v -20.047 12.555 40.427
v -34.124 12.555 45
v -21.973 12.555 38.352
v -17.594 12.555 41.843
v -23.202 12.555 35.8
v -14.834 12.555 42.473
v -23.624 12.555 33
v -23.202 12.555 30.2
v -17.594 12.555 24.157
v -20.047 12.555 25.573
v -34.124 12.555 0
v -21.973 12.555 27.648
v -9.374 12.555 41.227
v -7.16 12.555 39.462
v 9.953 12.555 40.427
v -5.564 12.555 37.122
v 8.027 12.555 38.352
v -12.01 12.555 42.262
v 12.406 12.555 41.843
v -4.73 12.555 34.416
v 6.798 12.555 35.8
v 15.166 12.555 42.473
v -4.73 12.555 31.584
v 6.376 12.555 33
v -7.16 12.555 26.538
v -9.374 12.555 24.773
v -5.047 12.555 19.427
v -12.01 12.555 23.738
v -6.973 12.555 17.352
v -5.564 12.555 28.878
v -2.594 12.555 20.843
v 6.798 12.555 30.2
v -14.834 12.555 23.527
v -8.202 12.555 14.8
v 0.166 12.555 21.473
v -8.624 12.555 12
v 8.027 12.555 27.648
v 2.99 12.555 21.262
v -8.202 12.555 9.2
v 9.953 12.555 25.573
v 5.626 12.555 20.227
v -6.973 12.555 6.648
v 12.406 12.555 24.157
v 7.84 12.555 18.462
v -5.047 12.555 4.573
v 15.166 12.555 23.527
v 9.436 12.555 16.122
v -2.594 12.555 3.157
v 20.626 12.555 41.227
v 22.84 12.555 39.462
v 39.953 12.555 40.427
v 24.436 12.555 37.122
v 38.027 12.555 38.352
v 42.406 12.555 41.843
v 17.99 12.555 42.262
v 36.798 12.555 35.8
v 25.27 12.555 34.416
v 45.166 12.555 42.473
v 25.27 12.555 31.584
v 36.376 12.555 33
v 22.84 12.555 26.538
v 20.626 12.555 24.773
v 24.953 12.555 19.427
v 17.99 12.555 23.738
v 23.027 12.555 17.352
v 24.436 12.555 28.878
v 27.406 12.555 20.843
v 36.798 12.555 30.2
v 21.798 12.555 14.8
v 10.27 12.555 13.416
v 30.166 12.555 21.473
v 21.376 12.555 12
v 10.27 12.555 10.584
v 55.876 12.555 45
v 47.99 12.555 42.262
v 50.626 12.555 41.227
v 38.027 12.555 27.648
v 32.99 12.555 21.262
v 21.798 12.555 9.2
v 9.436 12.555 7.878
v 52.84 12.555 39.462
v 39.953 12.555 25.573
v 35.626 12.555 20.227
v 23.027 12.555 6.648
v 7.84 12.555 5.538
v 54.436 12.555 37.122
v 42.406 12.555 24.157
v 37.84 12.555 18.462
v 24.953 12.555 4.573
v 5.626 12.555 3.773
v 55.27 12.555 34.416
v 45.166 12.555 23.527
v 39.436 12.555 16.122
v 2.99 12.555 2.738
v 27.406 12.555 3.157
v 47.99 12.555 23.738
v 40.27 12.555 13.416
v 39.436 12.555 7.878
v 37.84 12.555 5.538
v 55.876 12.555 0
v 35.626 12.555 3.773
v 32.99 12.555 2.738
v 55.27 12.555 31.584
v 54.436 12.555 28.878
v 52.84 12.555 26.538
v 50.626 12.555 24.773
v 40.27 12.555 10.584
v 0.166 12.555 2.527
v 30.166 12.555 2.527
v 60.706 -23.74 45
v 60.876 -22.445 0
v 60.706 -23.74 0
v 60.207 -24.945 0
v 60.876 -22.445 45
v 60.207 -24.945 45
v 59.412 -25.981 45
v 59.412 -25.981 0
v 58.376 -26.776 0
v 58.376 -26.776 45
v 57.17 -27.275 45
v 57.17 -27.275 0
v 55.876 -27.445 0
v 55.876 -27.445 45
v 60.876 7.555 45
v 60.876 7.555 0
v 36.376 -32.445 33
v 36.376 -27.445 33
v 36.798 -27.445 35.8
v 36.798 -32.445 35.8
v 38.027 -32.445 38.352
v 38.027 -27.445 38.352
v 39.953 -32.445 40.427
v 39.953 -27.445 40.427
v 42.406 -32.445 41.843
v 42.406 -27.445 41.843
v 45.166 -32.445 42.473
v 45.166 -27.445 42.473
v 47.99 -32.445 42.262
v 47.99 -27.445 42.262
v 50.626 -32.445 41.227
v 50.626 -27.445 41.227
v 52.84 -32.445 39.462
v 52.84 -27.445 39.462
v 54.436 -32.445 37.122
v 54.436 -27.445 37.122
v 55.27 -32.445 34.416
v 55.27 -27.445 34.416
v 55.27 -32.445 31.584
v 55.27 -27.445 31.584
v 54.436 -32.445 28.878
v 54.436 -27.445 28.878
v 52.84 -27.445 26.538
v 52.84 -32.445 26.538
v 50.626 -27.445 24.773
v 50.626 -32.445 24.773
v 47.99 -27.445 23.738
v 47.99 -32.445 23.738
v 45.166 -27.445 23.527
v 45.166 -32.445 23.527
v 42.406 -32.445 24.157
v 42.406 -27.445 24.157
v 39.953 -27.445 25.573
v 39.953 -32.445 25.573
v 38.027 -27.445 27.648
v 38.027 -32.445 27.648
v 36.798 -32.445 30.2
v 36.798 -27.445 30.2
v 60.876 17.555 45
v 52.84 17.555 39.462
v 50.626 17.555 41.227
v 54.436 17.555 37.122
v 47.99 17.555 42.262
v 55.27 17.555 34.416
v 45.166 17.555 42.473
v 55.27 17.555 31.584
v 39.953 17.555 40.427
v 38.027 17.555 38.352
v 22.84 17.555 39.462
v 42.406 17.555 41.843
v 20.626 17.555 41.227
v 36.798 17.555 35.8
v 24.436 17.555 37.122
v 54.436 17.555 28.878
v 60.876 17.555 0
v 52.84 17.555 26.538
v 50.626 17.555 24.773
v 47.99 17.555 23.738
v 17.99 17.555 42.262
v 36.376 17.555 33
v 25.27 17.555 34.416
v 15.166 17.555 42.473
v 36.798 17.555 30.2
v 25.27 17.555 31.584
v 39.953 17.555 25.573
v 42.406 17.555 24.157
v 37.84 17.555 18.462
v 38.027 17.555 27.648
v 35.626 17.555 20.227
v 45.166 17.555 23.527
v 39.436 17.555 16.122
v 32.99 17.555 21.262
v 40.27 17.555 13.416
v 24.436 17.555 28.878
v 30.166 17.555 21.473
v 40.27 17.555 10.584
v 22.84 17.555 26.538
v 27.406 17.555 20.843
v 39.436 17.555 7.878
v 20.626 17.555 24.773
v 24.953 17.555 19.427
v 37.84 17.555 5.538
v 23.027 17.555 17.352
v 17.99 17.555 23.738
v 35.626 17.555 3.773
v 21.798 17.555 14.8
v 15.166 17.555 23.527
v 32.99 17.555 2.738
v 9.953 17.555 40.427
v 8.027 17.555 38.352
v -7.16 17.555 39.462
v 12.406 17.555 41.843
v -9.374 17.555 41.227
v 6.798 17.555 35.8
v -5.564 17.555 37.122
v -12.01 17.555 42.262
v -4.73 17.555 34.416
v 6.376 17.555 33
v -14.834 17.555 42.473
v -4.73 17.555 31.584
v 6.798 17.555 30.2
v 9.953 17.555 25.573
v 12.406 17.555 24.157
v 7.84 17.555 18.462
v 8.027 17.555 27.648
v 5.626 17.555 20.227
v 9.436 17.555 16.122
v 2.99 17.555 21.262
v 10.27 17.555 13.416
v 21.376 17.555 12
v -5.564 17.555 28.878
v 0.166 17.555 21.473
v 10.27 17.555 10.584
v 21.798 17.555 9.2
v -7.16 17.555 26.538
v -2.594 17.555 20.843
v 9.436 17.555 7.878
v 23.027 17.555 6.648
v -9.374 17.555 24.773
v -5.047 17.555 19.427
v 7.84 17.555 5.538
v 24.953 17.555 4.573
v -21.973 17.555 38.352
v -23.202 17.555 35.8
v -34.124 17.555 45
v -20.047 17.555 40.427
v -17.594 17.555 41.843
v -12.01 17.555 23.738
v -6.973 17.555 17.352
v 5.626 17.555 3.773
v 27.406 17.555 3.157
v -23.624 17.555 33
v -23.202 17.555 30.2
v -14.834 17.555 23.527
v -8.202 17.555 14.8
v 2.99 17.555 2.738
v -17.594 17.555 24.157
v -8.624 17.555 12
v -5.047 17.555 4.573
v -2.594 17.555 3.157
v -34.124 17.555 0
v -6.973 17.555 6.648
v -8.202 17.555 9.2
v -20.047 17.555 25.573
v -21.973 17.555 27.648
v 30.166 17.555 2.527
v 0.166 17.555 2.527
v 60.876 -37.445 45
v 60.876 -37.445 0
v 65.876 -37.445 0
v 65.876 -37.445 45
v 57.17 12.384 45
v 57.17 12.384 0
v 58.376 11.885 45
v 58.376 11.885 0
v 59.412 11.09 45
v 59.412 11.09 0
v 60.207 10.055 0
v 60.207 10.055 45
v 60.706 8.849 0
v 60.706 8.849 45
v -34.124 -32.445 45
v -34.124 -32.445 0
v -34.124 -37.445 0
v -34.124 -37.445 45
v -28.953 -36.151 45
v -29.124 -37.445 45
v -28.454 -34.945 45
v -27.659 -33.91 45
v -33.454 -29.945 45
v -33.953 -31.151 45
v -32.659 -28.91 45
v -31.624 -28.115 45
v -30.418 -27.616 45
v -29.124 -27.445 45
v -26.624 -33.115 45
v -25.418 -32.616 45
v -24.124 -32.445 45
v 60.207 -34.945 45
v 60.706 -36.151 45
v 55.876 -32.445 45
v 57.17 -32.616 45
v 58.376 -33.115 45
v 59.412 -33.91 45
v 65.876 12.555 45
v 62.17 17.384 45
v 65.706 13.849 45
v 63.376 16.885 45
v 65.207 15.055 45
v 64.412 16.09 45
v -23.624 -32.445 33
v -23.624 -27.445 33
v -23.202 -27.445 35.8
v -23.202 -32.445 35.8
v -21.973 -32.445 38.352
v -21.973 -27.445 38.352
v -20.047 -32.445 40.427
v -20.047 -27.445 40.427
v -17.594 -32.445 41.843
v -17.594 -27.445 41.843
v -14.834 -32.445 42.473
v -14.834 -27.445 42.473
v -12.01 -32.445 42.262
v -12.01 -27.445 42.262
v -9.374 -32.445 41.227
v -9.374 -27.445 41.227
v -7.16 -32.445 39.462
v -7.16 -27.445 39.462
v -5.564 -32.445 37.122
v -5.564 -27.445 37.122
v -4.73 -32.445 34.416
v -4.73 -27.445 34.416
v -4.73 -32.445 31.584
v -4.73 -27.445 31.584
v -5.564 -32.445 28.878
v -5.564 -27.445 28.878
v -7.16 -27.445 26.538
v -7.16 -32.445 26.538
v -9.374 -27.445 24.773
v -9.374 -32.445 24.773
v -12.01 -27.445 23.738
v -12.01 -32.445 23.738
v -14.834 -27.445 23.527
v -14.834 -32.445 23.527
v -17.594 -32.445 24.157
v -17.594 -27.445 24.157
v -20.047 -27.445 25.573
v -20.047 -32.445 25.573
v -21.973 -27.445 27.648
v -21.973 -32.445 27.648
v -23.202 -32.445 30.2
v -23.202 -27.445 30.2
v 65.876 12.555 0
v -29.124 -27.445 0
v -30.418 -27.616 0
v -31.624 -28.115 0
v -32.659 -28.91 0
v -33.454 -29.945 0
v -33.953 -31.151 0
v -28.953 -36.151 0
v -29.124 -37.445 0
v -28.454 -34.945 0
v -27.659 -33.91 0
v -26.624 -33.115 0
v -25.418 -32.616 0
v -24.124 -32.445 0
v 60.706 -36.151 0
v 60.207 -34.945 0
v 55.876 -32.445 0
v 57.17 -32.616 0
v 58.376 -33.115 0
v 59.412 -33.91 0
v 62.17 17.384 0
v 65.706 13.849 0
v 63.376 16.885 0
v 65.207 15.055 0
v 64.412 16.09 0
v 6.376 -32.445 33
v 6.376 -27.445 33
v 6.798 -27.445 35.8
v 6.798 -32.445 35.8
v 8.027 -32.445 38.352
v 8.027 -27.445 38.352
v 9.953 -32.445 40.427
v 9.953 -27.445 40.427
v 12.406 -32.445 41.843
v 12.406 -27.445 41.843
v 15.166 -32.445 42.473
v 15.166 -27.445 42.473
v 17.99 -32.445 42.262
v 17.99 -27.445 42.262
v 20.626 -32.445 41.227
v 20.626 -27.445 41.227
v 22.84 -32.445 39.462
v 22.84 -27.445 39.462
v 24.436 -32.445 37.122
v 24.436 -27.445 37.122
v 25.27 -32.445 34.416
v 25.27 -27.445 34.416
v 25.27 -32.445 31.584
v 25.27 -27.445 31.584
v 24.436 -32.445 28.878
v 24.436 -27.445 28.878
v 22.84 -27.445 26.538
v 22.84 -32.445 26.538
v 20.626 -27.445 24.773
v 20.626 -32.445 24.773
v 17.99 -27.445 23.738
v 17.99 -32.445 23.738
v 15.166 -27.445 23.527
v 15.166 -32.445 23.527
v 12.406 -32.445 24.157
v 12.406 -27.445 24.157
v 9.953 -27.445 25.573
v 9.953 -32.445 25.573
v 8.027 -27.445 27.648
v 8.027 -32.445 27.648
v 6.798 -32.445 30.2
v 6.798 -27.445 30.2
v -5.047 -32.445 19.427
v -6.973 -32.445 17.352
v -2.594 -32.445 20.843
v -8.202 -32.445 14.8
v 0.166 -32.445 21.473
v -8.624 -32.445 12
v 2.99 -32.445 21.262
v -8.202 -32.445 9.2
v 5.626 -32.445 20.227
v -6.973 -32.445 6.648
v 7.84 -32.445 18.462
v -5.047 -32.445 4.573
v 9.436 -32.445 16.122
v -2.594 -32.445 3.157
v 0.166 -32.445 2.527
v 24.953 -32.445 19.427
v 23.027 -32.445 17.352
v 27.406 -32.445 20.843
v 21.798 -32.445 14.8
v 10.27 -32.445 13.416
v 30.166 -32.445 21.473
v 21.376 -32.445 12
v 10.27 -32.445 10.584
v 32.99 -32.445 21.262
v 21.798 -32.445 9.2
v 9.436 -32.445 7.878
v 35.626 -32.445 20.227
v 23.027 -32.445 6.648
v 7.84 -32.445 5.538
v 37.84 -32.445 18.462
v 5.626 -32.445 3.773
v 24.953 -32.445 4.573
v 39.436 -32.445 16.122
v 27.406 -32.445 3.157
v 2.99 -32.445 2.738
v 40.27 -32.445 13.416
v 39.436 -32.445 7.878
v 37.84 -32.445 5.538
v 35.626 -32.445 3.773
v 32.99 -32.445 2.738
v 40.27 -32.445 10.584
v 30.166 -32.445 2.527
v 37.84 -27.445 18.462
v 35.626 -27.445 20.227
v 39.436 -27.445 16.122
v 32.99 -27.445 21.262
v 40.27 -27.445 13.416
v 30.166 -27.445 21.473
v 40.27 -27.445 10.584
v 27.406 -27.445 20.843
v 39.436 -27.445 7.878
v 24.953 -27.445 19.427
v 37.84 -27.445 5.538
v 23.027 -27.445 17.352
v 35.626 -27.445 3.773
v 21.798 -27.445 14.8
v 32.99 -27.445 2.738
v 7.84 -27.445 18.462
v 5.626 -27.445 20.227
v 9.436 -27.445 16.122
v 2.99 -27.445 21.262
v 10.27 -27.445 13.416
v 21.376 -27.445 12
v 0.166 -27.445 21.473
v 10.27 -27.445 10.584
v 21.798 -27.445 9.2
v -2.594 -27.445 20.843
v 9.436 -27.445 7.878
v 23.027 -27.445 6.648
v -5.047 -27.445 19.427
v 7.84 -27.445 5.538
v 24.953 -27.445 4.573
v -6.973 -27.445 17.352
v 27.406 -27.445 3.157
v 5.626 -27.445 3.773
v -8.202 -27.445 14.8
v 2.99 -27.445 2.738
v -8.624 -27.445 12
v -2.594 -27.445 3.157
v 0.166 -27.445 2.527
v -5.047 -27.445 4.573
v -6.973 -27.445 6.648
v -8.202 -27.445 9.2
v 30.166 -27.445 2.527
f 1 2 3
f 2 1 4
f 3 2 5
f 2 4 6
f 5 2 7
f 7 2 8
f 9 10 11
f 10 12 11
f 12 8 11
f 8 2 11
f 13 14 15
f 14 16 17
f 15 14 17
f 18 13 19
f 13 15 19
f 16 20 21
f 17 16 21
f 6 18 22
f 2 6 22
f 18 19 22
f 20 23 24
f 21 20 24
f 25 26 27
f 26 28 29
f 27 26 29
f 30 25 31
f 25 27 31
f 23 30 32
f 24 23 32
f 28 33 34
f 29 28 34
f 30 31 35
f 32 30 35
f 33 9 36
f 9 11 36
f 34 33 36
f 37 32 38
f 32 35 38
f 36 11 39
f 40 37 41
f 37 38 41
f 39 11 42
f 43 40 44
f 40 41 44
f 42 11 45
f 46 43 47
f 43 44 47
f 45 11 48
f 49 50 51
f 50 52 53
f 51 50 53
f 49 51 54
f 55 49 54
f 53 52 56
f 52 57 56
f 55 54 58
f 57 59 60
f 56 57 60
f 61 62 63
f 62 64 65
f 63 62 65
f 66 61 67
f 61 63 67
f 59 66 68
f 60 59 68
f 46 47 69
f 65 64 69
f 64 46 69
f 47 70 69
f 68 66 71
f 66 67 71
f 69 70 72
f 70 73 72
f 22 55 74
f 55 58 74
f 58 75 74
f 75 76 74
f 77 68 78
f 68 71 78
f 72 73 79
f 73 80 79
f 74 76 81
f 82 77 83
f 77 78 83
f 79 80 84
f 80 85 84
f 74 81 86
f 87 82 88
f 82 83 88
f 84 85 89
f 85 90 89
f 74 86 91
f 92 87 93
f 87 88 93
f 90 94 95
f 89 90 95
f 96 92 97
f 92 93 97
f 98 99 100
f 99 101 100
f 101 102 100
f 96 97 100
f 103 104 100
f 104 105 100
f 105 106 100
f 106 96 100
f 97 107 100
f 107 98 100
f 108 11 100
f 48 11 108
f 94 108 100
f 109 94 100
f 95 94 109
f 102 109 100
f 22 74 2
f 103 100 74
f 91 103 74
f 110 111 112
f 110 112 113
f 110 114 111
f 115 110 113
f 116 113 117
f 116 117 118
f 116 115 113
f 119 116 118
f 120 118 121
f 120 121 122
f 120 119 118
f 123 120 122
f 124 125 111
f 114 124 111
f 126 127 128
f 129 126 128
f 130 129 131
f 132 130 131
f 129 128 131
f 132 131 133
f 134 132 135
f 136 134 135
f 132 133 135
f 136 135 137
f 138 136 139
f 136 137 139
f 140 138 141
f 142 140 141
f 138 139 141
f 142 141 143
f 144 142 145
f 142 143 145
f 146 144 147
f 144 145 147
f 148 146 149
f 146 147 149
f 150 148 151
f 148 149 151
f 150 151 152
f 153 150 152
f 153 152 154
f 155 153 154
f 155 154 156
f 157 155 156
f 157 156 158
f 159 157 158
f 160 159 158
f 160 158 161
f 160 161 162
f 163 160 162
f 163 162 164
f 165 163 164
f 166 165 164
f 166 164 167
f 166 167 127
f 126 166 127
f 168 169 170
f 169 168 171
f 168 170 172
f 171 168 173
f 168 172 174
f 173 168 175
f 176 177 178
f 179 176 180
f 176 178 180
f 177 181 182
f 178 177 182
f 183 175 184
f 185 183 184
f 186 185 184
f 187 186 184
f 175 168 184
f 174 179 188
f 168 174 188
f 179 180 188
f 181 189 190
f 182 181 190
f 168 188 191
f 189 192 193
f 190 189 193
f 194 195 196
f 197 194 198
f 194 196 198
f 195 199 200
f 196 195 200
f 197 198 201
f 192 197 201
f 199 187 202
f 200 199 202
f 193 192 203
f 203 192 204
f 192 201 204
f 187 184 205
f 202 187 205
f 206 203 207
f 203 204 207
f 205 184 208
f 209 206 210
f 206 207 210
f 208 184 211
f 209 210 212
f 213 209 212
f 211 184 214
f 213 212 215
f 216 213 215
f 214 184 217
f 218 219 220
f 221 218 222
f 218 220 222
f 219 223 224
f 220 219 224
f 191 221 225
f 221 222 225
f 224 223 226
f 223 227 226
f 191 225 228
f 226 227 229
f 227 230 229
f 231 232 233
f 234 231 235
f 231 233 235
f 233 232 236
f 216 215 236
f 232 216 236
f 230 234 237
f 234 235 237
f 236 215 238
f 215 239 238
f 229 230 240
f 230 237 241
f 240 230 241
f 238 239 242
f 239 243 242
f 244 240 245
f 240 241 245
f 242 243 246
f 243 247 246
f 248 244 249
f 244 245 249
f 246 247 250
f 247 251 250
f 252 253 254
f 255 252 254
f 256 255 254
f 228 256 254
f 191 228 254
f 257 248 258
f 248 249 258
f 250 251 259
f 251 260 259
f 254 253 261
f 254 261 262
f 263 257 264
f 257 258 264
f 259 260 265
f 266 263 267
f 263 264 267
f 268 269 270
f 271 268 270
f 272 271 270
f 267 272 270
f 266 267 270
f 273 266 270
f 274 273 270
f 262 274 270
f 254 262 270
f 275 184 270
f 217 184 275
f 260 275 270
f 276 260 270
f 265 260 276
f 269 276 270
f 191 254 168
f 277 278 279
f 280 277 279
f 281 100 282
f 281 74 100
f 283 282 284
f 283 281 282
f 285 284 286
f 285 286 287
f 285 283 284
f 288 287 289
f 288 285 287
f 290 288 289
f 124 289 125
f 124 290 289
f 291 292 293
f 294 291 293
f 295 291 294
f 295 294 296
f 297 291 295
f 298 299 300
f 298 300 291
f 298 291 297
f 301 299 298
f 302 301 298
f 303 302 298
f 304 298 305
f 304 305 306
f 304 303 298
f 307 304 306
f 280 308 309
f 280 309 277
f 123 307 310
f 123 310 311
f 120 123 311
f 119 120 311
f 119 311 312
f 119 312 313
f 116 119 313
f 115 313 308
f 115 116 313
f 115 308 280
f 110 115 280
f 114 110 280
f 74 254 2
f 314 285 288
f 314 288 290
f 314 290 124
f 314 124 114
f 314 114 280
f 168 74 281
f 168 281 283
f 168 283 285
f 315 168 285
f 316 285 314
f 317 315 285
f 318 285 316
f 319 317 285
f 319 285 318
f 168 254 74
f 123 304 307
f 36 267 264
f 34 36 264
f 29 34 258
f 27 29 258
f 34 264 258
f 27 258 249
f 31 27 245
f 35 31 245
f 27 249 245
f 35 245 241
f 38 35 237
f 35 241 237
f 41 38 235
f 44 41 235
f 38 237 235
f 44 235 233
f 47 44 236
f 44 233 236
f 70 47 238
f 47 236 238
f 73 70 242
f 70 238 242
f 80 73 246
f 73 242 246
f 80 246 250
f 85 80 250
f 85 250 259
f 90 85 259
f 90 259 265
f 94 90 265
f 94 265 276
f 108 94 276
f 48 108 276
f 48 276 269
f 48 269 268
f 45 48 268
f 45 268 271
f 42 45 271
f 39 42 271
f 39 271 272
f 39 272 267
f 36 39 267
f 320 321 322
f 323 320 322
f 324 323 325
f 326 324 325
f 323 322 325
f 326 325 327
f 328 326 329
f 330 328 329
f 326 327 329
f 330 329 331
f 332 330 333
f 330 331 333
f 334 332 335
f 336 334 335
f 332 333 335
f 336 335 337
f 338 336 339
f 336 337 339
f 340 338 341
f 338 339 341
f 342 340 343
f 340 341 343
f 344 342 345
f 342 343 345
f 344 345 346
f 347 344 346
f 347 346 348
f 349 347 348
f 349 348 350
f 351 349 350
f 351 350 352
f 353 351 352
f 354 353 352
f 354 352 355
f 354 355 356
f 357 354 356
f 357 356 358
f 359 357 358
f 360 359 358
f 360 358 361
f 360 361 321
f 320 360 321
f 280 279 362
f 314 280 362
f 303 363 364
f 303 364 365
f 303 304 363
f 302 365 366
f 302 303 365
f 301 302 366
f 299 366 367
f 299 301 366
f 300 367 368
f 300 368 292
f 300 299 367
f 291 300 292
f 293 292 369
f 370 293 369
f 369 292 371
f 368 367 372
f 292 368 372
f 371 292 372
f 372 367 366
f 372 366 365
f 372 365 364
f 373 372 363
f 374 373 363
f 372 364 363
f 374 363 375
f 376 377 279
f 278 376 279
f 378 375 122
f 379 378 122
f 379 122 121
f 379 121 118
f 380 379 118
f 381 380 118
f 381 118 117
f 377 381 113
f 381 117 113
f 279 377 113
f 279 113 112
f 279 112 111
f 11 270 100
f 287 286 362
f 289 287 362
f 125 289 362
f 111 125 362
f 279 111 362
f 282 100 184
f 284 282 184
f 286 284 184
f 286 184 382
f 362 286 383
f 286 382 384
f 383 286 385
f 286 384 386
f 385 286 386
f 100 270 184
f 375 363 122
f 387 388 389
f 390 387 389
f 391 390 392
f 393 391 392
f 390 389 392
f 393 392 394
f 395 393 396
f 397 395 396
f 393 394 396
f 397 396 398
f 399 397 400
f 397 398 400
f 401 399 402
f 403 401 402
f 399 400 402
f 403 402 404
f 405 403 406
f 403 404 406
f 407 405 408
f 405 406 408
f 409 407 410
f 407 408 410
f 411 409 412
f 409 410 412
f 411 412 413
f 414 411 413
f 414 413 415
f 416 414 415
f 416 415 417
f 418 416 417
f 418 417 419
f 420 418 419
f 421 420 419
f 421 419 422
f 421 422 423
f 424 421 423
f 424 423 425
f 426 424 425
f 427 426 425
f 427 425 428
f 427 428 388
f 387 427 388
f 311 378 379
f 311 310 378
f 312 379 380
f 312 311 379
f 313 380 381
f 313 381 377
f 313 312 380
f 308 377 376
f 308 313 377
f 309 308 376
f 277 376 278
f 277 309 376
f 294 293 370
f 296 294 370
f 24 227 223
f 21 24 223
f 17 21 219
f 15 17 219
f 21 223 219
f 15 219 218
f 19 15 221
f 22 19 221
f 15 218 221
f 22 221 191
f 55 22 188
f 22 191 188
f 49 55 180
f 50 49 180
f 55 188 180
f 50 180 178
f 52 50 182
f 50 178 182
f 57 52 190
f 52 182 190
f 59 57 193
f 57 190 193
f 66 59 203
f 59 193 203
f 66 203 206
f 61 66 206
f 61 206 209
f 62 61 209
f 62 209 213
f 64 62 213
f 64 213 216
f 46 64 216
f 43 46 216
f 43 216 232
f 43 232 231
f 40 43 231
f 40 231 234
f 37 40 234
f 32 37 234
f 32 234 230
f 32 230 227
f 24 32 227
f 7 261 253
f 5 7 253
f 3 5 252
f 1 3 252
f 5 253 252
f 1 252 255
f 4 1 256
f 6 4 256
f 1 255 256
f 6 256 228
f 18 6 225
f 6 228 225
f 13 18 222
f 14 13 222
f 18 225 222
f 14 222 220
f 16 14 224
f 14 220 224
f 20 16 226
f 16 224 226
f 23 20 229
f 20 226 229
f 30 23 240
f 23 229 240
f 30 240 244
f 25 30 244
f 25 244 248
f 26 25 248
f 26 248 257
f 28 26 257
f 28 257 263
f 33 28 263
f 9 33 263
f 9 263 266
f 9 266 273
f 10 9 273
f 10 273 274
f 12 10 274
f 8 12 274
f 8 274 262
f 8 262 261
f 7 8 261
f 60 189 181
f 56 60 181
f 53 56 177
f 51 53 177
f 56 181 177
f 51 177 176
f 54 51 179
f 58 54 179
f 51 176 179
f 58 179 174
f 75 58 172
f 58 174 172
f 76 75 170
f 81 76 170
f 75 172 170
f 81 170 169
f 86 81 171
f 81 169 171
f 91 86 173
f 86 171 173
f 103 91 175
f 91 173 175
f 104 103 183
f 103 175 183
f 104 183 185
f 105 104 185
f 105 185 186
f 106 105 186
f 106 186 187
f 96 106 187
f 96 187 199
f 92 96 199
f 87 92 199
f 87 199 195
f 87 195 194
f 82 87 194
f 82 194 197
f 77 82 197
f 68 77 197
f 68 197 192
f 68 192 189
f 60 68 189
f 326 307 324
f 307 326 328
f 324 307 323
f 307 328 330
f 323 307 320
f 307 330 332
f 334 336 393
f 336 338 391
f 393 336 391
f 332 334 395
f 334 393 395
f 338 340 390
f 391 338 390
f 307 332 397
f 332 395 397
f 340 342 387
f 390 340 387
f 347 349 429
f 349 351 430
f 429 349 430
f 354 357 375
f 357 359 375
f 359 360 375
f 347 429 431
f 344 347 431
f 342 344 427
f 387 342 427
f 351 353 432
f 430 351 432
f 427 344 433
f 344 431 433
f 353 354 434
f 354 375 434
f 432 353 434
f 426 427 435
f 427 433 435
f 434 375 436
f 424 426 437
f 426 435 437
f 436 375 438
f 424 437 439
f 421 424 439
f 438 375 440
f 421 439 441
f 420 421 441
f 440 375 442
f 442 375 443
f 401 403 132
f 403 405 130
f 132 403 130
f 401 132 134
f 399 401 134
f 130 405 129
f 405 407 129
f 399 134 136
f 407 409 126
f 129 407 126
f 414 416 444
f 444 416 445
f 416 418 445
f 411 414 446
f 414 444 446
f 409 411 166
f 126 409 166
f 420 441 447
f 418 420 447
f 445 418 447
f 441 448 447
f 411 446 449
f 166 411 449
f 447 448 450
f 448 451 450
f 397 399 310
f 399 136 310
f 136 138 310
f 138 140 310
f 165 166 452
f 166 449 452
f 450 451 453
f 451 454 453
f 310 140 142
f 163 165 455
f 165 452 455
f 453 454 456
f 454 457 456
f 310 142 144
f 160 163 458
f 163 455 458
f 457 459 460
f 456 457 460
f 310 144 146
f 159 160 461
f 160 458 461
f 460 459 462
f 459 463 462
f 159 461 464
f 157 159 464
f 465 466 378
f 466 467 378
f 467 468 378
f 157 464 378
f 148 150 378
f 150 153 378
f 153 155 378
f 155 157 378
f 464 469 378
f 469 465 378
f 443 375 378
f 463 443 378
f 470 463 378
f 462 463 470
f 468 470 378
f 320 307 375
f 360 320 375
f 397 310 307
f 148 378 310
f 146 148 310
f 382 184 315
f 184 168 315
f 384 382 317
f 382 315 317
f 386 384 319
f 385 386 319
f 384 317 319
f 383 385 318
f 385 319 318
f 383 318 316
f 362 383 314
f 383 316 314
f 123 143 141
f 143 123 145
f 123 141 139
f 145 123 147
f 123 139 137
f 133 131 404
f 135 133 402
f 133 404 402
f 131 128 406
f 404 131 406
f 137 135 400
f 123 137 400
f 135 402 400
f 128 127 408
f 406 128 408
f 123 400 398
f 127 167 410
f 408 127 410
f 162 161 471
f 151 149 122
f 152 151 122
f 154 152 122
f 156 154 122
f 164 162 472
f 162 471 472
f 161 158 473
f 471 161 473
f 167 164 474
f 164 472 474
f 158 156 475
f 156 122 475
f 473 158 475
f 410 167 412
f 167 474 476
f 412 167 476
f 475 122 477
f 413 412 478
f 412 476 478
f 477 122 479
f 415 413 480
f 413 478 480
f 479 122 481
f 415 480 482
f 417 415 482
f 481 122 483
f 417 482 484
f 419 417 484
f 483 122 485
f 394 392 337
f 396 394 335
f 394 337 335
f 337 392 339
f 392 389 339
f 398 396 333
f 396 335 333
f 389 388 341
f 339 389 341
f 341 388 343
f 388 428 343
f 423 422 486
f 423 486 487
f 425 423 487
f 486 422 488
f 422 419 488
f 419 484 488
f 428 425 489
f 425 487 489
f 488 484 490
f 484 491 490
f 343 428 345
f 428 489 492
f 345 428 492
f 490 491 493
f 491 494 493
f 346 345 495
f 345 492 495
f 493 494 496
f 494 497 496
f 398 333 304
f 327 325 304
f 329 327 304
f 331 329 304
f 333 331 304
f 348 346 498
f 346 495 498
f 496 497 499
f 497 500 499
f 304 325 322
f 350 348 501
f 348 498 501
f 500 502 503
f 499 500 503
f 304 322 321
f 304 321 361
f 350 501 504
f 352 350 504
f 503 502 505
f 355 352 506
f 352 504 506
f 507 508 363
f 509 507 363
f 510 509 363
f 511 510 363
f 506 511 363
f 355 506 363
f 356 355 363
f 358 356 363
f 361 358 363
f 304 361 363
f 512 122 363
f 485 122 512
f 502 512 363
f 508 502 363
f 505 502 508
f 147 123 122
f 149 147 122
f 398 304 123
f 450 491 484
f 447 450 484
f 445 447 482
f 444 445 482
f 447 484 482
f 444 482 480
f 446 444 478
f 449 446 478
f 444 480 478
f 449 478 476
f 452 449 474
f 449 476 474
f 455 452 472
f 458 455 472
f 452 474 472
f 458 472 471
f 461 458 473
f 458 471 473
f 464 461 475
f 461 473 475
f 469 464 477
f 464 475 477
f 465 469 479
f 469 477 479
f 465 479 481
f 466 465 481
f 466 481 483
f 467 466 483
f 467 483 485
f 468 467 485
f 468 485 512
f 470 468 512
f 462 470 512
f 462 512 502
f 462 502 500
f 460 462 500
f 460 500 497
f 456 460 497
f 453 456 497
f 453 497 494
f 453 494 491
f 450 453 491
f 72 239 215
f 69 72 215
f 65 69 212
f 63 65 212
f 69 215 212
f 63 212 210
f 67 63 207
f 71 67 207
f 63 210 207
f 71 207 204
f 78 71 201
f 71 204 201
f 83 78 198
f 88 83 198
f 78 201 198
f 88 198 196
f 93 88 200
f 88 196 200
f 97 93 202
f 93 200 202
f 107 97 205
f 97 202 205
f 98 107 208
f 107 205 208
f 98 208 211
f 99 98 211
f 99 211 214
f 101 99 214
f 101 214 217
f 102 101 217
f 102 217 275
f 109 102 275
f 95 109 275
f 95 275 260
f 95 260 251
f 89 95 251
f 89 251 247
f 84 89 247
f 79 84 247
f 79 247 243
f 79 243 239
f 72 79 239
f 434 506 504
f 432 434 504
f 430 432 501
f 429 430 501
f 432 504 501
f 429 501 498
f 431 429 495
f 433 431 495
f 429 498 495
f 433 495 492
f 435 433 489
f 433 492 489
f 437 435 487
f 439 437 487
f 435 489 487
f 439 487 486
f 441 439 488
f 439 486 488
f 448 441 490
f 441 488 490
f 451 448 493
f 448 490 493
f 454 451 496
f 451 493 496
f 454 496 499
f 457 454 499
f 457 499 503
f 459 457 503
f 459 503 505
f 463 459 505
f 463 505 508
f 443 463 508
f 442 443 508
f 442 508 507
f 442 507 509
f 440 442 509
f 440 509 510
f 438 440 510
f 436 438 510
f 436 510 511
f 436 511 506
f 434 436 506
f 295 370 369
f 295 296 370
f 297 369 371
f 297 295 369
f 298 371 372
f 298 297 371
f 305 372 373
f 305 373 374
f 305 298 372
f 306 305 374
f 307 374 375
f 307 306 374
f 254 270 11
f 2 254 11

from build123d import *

# Parameters (mm, degrees)
F1_DEPTH = 45
F2_R     = 4.99999
F3_R     = 9.5
F4_DEPTH = 80


# Not quite as in the source:
# - a fillet or chamfer is up to 0.001 mm smaller than in the source, because OpenCascade refuses the exact size


with BuildPart() as f1:
    # F0 (on Top) → F1 (new body)
    with BuildSketch(Plane.XY):
        Polygon((65.8763971276, 17.5545628369), (-34.1236028724, 17.5545628369), (-34.1236028724, 12.5545628369), (60.8763971276, 12.5545628369), (60.8763971276, -27.4454371631), (-34.1236028724, -27.4454371631), (-34.1236028724, -32.4454371631), (-34.1236028724, -37.4454371631), (-29.1236028724, -37.4454371631), (-29.1236028724, -32.4454371631), (60.8763971276, -32.4454371631), (60.8763971276, -37.4454371631), (65.8763971276, -37.4454371631), (65.8763971276, -32.4454371631), align=None)
    extrude(amount=F1_DEPTH)

    # F2 (radius 5 in the source; OpenCascade refuses exactly that, so slightly less here)
    f2_edges = [f1.edges().sort_by_distance(p)[0] for p in [
        (60.876397, 12.554563, 22.5),
        (60.876397, -27.445437, 22.5),
        (65.876397, 17.554563, 22.5),
        (60.876397, -32.445437, 22.5),
        (-29.123603, -32.445437, 22.5),
        (-34.123603, -27.445437, 22.5),
    ]]
    fillet(f2_edges, radius=F2_R)

    # F3 (on face) → F4 (cut)
    with BuildSketch(Plane(origin=(0, 17.5545628369, 0), x_dir=(-1, 0, 0), z_dir=(0, 1, 0))):
        with Locations((-45.8763971276, 33)):
            Circle(F3_R)
        with Locations((-0.8763971276, 12)):
            Circle(F3_R)
        with Locations((14.1236028724, 33)):
            Circle(F3_R)
        with Locations((-30.8763971276, 12)):
            Circle(F3_R)
        with Locations((-15.8763971276, 33)):
            Circle(F3_R)
    extrude(amount=-F4_DEPTH, mode=Mode.SUBTRACT)


solid = f1.part
